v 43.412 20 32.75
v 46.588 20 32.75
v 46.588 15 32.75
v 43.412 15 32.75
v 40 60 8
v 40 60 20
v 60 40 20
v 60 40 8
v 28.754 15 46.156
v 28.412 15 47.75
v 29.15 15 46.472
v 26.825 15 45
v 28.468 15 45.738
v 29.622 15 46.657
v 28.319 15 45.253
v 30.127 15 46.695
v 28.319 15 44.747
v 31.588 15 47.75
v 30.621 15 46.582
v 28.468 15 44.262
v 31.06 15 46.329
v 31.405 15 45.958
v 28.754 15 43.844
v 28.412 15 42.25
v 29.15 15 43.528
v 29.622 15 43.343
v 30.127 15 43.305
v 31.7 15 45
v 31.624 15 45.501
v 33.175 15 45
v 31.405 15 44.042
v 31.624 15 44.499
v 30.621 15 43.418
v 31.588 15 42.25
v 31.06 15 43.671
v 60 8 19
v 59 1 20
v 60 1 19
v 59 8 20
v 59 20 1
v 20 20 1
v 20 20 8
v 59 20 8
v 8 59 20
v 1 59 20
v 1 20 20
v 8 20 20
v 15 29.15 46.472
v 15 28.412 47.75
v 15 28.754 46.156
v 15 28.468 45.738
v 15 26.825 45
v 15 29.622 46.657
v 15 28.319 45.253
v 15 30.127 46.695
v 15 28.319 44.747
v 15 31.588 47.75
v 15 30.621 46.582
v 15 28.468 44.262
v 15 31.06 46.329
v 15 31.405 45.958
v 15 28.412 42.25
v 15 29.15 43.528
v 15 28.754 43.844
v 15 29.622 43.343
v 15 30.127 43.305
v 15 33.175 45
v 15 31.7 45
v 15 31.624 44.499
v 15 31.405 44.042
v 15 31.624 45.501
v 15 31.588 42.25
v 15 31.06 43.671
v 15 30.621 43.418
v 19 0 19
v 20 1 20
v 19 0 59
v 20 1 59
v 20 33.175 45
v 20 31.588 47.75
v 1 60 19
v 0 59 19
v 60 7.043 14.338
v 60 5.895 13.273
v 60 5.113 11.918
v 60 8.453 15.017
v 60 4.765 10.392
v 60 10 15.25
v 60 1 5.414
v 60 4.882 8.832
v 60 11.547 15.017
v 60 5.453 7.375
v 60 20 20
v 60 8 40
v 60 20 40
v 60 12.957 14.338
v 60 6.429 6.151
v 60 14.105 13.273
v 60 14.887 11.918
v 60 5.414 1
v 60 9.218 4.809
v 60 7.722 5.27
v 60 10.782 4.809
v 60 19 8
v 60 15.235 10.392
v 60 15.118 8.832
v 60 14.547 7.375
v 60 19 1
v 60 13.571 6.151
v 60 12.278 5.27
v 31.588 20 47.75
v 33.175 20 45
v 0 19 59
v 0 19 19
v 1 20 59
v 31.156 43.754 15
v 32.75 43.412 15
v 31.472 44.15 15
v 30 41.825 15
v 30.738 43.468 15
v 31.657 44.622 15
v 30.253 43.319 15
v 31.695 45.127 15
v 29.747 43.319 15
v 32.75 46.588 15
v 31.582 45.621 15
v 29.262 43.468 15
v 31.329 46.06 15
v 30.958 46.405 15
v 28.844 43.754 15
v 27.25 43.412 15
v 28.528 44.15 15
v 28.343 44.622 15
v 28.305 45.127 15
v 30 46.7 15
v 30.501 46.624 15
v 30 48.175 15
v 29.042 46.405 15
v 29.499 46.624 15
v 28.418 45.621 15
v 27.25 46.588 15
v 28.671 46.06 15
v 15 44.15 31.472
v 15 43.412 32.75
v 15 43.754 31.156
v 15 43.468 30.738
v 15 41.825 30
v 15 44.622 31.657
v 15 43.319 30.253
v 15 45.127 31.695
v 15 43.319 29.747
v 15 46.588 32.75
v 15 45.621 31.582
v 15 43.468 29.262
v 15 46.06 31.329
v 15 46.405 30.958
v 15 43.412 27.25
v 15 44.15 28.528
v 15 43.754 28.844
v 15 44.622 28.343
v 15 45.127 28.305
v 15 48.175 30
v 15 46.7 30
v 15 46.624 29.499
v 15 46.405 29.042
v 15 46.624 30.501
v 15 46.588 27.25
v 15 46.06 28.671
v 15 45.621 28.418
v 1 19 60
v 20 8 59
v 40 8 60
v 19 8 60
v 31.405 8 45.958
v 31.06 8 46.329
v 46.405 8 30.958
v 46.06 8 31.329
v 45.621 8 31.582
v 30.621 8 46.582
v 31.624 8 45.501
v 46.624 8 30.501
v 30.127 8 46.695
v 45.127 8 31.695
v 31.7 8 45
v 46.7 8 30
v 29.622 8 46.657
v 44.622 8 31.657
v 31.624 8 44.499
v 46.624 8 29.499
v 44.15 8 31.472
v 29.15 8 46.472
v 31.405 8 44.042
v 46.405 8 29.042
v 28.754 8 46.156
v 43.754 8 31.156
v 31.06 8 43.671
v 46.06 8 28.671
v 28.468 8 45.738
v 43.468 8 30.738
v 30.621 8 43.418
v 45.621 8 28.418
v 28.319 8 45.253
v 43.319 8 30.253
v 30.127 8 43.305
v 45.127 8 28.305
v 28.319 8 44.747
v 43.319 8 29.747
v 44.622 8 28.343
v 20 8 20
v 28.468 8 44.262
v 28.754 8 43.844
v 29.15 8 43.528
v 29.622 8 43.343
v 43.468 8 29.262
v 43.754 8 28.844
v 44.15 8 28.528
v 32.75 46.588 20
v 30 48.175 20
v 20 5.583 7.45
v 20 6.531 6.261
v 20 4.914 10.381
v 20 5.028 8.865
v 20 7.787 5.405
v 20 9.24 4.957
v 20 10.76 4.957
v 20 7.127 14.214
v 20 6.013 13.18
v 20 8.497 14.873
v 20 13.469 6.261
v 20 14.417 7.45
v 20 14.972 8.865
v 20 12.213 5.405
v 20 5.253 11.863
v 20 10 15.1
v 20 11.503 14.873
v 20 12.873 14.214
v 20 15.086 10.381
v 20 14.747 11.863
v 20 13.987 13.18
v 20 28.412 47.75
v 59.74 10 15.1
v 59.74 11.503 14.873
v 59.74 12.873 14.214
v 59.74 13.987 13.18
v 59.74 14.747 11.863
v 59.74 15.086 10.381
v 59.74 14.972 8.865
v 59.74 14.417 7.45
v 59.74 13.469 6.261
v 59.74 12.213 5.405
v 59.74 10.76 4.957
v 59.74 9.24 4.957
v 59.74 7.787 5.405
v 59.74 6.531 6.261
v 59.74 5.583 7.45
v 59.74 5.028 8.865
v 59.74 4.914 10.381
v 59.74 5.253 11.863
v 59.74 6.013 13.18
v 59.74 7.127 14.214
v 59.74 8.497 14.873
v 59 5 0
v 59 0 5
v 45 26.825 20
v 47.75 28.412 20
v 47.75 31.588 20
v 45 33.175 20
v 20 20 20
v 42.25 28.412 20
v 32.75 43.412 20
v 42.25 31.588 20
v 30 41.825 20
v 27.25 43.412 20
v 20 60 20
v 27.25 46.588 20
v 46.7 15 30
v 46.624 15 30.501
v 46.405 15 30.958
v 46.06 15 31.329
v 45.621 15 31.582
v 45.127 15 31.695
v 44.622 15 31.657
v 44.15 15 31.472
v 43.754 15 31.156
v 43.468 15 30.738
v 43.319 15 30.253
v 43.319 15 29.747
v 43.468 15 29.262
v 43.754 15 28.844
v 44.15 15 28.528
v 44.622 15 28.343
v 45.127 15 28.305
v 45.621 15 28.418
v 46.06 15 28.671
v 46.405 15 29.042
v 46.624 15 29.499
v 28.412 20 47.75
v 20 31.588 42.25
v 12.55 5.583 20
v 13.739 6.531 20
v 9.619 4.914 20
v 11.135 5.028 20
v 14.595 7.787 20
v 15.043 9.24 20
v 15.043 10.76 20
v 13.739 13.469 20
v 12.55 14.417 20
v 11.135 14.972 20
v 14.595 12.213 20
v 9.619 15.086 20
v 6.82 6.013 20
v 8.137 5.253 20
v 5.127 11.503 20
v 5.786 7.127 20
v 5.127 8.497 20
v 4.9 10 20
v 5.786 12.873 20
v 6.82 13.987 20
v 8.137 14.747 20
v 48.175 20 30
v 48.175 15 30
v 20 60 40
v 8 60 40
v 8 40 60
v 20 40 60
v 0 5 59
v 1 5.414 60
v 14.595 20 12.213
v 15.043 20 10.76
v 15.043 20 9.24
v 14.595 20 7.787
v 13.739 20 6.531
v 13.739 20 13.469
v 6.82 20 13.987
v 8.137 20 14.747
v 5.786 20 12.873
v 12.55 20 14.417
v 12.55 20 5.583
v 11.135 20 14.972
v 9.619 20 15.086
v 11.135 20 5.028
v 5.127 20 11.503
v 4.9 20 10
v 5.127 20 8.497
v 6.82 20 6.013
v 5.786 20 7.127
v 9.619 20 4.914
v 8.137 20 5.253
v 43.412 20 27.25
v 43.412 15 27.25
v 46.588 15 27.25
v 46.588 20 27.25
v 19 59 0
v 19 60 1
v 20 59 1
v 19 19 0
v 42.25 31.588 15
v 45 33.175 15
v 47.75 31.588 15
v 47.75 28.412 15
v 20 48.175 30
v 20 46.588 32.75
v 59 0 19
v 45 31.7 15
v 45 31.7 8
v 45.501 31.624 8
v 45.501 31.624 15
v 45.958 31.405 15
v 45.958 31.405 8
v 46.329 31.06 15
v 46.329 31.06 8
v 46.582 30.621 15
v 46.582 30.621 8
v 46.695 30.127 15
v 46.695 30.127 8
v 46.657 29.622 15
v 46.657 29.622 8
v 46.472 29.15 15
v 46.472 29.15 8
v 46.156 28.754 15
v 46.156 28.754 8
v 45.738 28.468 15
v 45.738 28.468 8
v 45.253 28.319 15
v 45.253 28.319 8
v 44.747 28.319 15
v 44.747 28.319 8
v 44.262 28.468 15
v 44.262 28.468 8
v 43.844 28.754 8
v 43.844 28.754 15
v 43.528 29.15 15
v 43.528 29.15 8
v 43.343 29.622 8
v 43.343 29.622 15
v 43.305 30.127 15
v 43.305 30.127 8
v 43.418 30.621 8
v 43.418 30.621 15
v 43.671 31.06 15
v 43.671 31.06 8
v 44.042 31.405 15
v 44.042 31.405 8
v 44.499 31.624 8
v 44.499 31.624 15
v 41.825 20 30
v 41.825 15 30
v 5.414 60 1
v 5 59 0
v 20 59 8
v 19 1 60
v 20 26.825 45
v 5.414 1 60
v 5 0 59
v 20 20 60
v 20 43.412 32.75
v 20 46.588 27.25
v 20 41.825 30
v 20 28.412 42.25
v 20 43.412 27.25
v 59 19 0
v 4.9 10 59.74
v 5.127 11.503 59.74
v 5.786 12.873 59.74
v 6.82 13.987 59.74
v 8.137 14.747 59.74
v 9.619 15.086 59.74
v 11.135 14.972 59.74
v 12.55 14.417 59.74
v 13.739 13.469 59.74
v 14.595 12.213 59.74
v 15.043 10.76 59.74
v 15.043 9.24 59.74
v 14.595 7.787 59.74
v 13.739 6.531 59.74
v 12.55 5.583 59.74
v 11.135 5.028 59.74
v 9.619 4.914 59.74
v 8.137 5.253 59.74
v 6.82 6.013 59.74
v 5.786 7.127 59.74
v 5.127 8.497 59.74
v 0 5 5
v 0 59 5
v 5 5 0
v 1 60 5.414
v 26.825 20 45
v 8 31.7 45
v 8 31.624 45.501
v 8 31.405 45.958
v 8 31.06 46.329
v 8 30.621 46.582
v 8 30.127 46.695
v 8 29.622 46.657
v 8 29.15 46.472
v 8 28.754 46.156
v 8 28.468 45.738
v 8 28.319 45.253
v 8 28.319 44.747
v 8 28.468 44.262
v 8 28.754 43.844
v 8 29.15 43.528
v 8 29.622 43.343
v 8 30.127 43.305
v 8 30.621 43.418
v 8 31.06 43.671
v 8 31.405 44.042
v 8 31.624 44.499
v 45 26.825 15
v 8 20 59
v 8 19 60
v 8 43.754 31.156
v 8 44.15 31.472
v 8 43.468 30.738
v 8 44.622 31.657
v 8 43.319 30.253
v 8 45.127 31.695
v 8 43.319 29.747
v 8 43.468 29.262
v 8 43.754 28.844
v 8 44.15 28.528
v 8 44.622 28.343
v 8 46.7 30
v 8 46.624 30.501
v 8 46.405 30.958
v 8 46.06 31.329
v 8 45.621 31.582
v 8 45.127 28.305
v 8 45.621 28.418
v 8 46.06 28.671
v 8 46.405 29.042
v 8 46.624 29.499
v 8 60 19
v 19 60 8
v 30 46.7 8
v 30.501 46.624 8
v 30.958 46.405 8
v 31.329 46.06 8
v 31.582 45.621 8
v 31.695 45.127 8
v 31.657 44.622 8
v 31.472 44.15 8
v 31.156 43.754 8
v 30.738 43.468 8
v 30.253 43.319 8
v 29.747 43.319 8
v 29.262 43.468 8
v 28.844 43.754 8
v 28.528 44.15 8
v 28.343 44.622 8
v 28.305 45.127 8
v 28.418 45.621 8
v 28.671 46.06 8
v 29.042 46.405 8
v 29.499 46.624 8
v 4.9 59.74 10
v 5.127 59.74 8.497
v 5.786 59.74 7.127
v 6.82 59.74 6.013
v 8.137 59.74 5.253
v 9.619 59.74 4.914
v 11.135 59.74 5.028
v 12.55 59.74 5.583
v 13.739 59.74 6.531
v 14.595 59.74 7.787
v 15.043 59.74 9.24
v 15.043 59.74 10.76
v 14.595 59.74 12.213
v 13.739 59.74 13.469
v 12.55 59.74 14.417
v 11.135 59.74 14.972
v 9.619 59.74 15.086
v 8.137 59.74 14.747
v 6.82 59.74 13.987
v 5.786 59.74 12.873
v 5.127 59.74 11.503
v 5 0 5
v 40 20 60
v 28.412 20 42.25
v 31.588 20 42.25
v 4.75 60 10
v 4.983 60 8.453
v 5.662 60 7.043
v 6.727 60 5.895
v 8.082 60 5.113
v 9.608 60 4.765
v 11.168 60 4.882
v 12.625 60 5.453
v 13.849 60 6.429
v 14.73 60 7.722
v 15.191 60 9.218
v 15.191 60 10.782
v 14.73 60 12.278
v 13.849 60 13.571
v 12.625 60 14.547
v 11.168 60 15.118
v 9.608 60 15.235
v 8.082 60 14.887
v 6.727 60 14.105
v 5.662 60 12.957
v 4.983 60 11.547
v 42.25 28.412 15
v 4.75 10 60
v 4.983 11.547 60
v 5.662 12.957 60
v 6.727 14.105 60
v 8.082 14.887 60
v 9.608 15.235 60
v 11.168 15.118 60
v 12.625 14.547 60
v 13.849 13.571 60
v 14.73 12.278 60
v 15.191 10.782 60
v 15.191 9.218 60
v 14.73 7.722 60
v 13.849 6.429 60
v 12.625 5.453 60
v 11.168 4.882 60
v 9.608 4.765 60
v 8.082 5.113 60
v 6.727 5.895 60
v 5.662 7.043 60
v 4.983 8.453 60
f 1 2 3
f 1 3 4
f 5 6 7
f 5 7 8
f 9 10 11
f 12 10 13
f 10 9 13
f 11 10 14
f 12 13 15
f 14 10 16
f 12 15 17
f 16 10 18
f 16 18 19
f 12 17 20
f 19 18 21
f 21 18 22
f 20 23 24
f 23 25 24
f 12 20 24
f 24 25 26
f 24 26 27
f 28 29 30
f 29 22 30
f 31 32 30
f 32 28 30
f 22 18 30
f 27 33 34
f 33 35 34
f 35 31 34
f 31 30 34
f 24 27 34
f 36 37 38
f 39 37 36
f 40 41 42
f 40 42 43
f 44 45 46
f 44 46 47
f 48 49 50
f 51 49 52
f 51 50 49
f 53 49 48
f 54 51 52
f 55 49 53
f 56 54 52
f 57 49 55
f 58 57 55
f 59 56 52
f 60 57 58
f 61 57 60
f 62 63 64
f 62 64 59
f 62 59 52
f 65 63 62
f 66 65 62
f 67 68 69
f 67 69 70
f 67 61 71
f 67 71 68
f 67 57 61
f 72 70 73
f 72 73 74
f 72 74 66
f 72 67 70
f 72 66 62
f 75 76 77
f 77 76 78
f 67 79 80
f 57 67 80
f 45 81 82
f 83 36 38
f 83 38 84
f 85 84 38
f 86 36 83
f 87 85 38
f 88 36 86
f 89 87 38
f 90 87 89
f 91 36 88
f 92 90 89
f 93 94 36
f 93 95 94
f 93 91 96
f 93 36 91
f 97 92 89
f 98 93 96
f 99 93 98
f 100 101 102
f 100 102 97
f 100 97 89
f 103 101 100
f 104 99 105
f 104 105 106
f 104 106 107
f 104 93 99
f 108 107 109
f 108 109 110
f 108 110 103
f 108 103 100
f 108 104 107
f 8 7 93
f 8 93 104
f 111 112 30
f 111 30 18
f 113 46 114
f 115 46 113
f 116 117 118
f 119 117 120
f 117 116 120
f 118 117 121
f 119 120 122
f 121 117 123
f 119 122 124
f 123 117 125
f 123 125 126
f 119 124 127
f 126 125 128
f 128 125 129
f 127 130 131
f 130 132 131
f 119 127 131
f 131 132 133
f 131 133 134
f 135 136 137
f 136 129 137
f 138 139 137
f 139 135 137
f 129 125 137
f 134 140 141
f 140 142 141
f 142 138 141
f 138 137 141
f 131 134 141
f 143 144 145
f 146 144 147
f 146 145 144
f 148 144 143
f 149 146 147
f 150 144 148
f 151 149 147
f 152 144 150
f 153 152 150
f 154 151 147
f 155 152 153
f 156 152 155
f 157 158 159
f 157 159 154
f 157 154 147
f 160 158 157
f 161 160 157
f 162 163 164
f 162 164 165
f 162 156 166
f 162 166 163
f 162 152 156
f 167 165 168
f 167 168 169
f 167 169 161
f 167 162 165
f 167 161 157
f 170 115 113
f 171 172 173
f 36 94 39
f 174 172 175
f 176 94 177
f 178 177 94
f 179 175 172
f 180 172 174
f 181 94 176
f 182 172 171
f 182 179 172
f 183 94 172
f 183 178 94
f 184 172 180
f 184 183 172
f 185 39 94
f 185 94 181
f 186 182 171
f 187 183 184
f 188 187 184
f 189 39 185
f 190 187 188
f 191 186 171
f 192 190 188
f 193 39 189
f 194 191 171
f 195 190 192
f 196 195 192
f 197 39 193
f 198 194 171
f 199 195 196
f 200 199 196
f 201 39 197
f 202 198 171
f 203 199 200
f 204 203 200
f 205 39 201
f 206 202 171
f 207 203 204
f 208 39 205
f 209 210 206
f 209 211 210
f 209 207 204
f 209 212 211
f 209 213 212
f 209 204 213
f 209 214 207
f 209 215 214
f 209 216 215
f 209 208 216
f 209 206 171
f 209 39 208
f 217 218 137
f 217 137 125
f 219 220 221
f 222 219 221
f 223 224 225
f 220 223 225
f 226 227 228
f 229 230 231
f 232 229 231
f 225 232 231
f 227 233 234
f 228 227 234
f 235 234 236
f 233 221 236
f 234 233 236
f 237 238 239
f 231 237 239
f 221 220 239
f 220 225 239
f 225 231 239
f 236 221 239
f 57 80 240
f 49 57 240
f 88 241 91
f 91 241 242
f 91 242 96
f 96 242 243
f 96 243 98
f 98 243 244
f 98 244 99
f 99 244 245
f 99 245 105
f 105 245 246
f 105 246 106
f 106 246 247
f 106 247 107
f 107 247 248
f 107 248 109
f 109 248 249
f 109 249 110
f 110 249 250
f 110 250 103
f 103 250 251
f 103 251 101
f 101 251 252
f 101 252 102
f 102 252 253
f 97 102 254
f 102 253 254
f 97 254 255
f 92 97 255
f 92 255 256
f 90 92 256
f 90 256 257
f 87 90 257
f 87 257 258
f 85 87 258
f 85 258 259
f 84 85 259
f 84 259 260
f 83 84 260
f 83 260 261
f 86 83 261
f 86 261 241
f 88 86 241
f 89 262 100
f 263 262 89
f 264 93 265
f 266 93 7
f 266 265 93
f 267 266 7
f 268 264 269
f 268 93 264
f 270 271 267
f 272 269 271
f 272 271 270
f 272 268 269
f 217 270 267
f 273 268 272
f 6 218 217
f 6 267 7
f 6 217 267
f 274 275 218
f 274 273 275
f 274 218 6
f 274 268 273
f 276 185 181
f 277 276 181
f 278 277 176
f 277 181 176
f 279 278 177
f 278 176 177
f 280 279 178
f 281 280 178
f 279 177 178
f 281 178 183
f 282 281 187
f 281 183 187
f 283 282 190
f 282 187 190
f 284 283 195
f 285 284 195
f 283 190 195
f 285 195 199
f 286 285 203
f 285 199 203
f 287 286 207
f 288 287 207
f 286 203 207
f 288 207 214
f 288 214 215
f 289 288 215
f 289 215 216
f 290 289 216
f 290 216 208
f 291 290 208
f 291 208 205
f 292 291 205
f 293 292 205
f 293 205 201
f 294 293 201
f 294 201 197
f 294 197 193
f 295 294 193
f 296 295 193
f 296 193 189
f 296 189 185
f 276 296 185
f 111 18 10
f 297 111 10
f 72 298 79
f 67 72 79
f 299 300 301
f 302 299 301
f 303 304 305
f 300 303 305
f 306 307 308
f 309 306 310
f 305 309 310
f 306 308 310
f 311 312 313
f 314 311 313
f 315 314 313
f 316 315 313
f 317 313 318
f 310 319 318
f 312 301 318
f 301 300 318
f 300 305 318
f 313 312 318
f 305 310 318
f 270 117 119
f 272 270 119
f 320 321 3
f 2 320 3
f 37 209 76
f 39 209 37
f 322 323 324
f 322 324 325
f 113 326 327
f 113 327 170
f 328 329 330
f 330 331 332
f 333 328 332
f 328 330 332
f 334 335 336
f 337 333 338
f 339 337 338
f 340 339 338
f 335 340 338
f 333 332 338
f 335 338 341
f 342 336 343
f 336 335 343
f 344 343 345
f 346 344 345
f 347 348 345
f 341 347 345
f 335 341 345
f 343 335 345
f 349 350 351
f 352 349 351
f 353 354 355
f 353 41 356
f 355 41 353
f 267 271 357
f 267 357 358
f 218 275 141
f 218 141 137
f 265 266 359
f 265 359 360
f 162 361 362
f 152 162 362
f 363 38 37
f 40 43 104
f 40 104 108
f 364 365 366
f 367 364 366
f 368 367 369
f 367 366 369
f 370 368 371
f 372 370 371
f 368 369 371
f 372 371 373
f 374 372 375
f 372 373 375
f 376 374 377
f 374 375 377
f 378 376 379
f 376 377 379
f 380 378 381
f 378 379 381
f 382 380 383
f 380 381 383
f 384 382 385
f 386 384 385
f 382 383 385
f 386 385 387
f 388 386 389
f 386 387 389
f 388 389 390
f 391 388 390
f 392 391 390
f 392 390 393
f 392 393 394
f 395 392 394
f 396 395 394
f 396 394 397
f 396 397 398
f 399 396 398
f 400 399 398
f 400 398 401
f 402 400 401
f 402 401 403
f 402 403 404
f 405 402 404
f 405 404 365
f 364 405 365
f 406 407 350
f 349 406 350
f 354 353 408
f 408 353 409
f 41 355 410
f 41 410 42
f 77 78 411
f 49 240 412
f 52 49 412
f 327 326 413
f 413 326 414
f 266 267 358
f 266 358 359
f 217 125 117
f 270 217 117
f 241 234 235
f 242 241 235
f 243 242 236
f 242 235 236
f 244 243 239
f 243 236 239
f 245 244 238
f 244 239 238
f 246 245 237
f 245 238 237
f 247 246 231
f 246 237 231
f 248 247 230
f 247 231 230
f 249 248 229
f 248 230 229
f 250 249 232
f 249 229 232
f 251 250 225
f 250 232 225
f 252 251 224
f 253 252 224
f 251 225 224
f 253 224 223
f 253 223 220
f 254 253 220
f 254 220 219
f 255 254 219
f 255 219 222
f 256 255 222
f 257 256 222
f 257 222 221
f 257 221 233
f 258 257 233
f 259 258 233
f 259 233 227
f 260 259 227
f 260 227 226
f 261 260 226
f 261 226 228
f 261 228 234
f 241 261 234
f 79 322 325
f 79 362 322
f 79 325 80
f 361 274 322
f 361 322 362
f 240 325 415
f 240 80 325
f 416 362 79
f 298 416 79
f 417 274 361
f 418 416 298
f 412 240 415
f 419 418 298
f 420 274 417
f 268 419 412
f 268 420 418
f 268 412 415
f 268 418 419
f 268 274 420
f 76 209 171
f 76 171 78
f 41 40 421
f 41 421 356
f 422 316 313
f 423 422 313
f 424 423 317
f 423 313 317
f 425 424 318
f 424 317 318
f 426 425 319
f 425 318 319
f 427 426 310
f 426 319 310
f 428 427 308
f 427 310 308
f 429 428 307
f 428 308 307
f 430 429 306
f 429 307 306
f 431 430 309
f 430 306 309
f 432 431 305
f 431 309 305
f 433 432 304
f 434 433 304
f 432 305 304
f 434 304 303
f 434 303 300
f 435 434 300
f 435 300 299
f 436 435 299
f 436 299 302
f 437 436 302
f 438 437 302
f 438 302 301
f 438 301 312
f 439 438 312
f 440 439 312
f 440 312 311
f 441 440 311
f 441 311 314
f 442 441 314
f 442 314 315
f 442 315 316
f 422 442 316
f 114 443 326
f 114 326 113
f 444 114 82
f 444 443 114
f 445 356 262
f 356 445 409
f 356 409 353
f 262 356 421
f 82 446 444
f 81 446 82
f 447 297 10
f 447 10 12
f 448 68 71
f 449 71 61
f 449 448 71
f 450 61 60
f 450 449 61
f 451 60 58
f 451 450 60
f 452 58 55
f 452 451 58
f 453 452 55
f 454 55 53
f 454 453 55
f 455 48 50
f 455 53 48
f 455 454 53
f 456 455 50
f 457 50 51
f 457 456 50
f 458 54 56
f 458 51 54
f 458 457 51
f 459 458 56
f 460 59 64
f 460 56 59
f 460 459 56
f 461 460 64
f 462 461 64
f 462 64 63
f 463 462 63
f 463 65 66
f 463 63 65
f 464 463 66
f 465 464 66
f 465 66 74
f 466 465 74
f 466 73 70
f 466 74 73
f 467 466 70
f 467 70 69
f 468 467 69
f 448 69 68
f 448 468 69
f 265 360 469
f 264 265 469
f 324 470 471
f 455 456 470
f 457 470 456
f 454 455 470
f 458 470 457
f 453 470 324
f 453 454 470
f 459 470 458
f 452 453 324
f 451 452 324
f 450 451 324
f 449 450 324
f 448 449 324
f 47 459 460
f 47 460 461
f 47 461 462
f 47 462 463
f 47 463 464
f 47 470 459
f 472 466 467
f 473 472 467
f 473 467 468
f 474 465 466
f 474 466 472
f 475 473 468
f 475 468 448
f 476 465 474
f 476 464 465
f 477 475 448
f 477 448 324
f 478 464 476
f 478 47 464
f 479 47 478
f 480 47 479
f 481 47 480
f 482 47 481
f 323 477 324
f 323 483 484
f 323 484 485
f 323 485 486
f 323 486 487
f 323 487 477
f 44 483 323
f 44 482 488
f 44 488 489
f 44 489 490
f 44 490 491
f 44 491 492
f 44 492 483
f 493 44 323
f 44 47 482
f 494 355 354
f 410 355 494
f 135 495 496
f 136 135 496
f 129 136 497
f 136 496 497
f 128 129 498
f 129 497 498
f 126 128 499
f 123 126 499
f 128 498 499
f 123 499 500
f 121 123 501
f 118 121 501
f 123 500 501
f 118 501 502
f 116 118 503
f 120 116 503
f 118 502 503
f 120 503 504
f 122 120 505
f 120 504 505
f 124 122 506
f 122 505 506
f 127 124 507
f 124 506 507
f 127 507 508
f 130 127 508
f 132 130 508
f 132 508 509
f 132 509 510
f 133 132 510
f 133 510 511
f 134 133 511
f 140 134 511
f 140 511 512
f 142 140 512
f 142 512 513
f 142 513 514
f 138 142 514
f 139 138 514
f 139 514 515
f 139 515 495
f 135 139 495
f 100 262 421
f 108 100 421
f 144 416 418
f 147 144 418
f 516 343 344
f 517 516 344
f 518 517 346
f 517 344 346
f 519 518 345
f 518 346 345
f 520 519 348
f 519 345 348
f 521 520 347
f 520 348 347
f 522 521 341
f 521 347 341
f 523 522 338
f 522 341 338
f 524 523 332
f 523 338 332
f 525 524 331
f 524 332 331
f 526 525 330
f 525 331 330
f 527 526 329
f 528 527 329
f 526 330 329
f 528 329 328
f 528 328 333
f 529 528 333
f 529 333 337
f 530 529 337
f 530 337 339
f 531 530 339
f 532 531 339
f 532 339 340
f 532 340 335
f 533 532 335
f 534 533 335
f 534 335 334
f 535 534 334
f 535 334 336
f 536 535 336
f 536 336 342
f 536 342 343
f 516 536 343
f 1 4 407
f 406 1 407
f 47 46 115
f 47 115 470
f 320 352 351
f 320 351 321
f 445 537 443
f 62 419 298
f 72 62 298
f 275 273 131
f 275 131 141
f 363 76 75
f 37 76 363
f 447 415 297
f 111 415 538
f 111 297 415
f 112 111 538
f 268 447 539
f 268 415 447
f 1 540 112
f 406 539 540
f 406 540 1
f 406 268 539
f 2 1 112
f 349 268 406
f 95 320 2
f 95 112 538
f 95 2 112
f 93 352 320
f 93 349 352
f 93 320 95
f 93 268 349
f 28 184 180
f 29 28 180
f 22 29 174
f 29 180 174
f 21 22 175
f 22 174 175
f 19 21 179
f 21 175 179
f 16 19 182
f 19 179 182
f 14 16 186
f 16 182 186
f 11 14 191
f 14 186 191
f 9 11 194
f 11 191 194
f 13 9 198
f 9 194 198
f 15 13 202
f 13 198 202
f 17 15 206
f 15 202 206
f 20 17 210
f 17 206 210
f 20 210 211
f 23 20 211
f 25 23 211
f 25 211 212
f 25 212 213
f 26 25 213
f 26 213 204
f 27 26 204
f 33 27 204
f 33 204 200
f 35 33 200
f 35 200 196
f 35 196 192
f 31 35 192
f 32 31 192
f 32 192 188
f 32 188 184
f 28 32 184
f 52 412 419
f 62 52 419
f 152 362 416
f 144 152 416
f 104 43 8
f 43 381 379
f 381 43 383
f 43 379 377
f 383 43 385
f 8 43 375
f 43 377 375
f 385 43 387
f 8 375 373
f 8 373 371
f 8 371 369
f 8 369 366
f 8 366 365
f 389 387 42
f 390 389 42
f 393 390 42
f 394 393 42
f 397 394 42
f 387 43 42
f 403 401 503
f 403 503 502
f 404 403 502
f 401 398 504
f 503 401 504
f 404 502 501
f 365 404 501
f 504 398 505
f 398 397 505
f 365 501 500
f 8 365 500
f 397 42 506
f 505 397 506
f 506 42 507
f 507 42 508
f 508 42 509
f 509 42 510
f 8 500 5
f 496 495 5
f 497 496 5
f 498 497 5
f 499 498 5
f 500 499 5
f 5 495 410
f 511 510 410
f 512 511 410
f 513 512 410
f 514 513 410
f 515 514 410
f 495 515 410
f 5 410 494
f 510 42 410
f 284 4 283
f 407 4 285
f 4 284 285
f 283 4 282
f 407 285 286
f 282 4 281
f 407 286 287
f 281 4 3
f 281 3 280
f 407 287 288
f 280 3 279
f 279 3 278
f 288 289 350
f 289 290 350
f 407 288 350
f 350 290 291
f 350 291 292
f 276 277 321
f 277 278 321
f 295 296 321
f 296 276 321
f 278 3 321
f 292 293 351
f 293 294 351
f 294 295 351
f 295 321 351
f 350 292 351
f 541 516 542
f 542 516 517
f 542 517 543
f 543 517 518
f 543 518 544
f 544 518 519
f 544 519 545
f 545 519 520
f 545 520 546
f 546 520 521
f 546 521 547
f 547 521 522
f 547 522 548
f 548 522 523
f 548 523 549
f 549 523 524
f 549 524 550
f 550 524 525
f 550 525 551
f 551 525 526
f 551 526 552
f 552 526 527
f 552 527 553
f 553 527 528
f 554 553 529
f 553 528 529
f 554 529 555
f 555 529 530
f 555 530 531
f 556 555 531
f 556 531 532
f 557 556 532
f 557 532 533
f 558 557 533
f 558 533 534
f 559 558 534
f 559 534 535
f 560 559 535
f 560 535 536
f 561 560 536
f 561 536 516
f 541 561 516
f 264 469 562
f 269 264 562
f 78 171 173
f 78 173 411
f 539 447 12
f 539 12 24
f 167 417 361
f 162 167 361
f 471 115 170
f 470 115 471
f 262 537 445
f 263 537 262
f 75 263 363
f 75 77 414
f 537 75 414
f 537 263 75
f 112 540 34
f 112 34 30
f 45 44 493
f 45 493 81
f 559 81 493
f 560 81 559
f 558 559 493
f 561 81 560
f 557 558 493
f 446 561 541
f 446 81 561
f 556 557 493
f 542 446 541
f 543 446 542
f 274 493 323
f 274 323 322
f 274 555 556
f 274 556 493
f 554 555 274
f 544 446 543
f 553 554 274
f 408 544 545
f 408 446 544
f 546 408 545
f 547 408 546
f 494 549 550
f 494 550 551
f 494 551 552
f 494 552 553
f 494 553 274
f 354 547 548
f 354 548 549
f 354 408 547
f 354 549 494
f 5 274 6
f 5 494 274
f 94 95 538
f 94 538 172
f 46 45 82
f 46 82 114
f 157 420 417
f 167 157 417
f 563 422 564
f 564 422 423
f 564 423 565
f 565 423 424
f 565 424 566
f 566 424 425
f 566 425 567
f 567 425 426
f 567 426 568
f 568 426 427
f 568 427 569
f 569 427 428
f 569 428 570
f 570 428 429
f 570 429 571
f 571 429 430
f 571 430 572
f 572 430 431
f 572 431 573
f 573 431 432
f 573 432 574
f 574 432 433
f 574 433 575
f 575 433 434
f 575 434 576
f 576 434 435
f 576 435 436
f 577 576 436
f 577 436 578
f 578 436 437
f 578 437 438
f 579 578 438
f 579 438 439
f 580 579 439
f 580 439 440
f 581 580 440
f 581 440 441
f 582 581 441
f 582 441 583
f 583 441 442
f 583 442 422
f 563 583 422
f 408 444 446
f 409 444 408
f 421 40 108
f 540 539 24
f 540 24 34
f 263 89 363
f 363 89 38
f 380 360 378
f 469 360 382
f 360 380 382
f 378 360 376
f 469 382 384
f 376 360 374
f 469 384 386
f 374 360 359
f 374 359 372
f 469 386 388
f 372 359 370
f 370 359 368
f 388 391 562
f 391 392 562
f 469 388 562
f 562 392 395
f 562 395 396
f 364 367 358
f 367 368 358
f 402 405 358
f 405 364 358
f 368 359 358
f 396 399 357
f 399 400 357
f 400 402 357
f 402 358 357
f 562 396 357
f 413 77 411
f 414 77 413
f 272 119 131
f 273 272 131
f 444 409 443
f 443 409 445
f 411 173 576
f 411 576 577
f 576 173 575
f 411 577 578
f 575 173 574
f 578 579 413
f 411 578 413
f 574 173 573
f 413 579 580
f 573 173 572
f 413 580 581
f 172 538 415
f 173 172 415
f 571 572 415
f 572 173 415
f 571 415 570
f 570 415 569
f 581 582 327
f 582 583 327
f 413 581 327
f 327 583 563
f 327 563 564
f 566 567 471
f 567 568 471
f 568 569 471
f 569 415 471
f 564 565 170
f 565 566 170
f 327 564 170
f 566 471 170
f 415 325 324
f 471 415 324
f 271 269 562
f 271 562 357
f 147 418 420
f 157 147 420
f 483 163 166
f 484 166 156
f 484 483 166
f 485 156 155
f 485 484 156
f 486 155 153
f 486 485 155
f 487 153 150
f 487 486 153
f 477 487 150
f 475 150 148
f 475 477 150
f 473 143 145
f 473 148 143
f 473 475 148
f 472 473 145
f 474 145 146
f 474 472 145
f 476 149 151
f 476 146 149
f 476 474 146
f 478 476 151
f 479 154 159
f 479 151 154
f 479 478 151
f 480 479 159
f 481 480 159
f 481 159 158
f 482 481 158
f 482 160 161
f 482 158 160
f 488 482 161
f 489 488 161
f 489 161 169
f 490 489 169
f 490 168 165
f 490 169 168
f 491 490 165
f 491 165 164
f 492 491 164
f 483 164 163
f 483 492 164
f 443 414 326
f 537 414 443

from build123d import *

# Parameters (mm, degrees)
BASE_SHAPE_BASE_DEPTH        = 20
BASE_SHAPE_EXTENSION_DEPTH   = 40
BASE_SHAPE_FINISH_SKETCH_W   = 12
BASE_SHAPE_FINISH_SKETCH_H   = 40
BASE_SHAPE_WALL_DEPTH        = 40
ROD_HOLE_D10_Z_D             = 10.2
ROD_HOLE_D10_Z_DEPTH         = 40
ROD_HOLE_D10_Z_CSINK_D       = 10.5
ROD_HOLE_D10_Z_CSINK_ANGLE   = 60
ROD_HOLE_D10_X_D             = 10.2
ROD_HOLE_D10_X_DEPTH         = 40
ROD_HOLE_D10_X_CSINK_D       = 10.5
ROD_HOLE_D10_X_CSINK_ANGLE   = 60
ROD_HOLE_D10_Y_D             = 10.2
ROD_HOLE_D10_Y_DEPTH         = 40
ROD_HOLE_D10_Y_CSINK_D       = 10.5
ROD_HOLE_D10_Y_CSINK_ANGLE   = 60
OUTER_CHAMFERS_SIZE          = 5
INNER_SMALLER_CHAMFERS_SIZE  = 1
LARGE_CHAMFERS_SIZE          = 20
HULL_PART_HOLES_M3_START     = 8
HULL_PART_HOLES_M3_OUTLINE_R = 1.7
HULL_PART_HOLES_M3_DEPTH     = 12
HULL_PART_NUT_HOLE_DEPTH     = 5


# Read off the part's stored shape, not the designer's step: hull_part_holes_m3
with BuildPart() as part:
    # base_shape_sketch → base_shape_base (new body)
    with BuildSketch(Plane.XY):
        Polygon((0, 0), (60, 0), (60, 20), (20, 20), (20, 60), (0, 60), align=None)
    extrude(amount=BASE_SHAPE_BASE_DEPTH)

    # base_shape_extension_sketch → base_shape_extension (add)
    with BuildSketch(Plane.XY.offset(20)):
        Polygon((20, 60), (20, 20), (60, 20), (60, 8), (20, 8), (20, 0), (0, 0), (0, 20), (8, 20), (8, 60), align=None)
    extrude(amount=BASE_SHAPE_EXTENSION_DEPTH)

    # base_shape_finish_sketch → base_shape_wall (add)
    with BuildSketch(Plane(origin=(20, 0, 0), x_dir=(0, 0, -1), z_dir=(1, 0, 0))):
        with Locations((-14, 40)):
            Rectangle(BASE_SHAPE_FINISH_SKETCH_W, BASE_SHAPE_FINISH_SKETCH_H)
    extrude(amount=BASE_SHAPE_WALL_DEPTH)

    # rod_hole_d10_z
    with Locations(Plane.XY.offset(60)):
        with Locations((10, 10)):
            CounterSinkHole(ROD_HOLE_D10_Z_D / 2, ROD_HOLE_D10_Z_CSINK_D / 2, depth=ROD_HOLE_D10_Z_DEPTH, counter_sink_angle=ROD_HOLE_D10_Z_CSINK_ANGLE)

    # rod_hole_d10_x
    with Locations(Plane(origin=(60, 0, 0), x_dir=(0, 0, -1), z_dir=(1, 0, 0))):
        with Locations((-10, 10)):
            CounterSinkHole(ROD_HOLE_D10_X_D / 2, ROD_HOLE_D10_X_CSINK_D / 2, depth=ROD_HOLE_D10_X_DEPTH, counter_sink_angle=ROD_HOLE_D10_X_CSINK_ANGLE)

    # rod_hole_d10_y
    with Locations(Plane(origin=(0, 60, 0), x_dir=(1, 0, 0), z_dir=(0, 1, 0))):
        with Locations((10, -10)):
            CounterSinkHole(ROD_HOLE_D10_Y_D / 2, ROD_HOLE_D10_Y_CSINK_D / 2, depth=ROD_HOLE_D10_Y_DEPTH, counter_sink_angle=ROD_HOLE_D10_Y_CSINK_ANGLE)

    # outer_chamfers
    outer_chamfers_edges = [part.edges().sort_by_distance(p)[0] for p in [
        (0, 0, 30),
        (30, 0, 0),
        (0, 30, 0),
    ]]
    chamfer(outer_chamfers_edges, length=OUTER_CHAMFERS_SIZE)

    # inner_smaller_chamfers
    inner_smaller_chamfers_edges = [part.edges().sort_by_distance(p)[0] for p in [
        (0, 60, 12.5),
        (60, 0, 12.5),
        (60, 4, 20),
        (40, 0, 20),
        (4, 60, 20),
        (0, 20, 40),
        (20, 0, 40),
        (4, 20, 60),
        (0, 12.5, 60),
        (20, 4, 60),
        (20, 60, 4),
        (0, 40, 20),
        (60, 20, 4),
        (12.5, 60, 0),
        (20, 40, 0),
        (40, 20, 0),
        (12.5, 0, 60),
        (2.5, 2.5, 60),
        (60, 12.5, 0),
        (60, 2.5, 2.5),
        (2.5, 60, 2.5),
    ]]
    chamfer(inner_smaller_chamfers_edges, length=INNER_SMALLER_CHAMFERS_SIZE)

    # large_chamfers
    large_chamfers_edges = [part.edges().sort_by_distance(p)[0] for p in [
        (14, 60, 60),
        (60, 14, 60),
        (60, 60, 14),
    ]]
    chamfer(large_chamfers_edges, length=LARGE_CHAMFERS_SIZE)

    # hull_part_holes_m3 outline → hull_part_holes_m3 (cut)
    with BuildSketch(Plane.YZ.offset(HULL_PART_HOLES_M3_START)):
        with Locations((45, 30)):
            Circle(HULL_PART_HOLES_M3_OUTLINE_R)
        with Locations((30, 45)):
            Circle(HULL_PART_HOLES_M3_OUTLINE_R)
    hull_part_holes_m3 = extrude(amount=HULL_PART_HOLES_M3_DEPTH, mode=Mode.SUBTRACT)

    # Sketch12 → hull_part_nut_hole (cut)
    with BuildSketch(Plane(origin=(20, 0, 0), x_dir=(0, 0, -1), z_dir=(1, 0, 0))):
        Polygon((-30, 48.175426481), (-32.75, 46.58771324), (-32.75, 43.41228676), (-30, 41.824573519), (-27.25, 43.41228676), (-27.25, 46.58771324), align=None)
        Polygon((-45, 33.175426481), (-47.75, 31.58771324), (-47.75, 28.41228676), (-45, 26.824573519), (-42.25, 28.41228676), (-42.25, 31.58771324), align=None)
    hull_part_nut_hole = extrude(amount=-HULL_PART_NUT_HOLE_DEPTH, mode=Mode.SUBTRACT)

    # hull_part_holes_mirror_x: hull_part_holes_m3, hull_part_nut_hole across plane
    add(hull_part_holes_m3.mirror(Plane(origin=(0, 0, 0), x_dir=(0.7071067811865482, 0, 0.7071067811865468), z_dir=(-0.707106781186547, 0, 0.7071067811865481))), mode=Mode.SUBTRACT)
    add(hull_part_nut_hole.mirror(Plane(origin=(0, 0, 0), x_dir=(0.7071067811865482, 0, 0.7071067811865468), z_dir=(-0.707106781186547, 0, 0.7071067811865481))), mode=Mode.SUBTRACT)

    # hull_part_holes_mirror_y: hull_part_holes_m3, hull_part_nut_hole across plane
    add(hull_part_holes_m3.mirror(Plane(origin=(0, 0, 0), x_dir=(0, 0, 1), z_dir=(-0.7071067811865482, 0.7071067811865469, 0))), mode=Mode.SUBTRACT)
    add(hull_part_nut_hole.mirror(Plane(origin=(0, 0, 0), x_dir=(0, 0, 1), z_dir=(-0.7071067811865482, 0.7071067811865469, 0))), mode=Mode.SUBTRACT)


solid = part.part
